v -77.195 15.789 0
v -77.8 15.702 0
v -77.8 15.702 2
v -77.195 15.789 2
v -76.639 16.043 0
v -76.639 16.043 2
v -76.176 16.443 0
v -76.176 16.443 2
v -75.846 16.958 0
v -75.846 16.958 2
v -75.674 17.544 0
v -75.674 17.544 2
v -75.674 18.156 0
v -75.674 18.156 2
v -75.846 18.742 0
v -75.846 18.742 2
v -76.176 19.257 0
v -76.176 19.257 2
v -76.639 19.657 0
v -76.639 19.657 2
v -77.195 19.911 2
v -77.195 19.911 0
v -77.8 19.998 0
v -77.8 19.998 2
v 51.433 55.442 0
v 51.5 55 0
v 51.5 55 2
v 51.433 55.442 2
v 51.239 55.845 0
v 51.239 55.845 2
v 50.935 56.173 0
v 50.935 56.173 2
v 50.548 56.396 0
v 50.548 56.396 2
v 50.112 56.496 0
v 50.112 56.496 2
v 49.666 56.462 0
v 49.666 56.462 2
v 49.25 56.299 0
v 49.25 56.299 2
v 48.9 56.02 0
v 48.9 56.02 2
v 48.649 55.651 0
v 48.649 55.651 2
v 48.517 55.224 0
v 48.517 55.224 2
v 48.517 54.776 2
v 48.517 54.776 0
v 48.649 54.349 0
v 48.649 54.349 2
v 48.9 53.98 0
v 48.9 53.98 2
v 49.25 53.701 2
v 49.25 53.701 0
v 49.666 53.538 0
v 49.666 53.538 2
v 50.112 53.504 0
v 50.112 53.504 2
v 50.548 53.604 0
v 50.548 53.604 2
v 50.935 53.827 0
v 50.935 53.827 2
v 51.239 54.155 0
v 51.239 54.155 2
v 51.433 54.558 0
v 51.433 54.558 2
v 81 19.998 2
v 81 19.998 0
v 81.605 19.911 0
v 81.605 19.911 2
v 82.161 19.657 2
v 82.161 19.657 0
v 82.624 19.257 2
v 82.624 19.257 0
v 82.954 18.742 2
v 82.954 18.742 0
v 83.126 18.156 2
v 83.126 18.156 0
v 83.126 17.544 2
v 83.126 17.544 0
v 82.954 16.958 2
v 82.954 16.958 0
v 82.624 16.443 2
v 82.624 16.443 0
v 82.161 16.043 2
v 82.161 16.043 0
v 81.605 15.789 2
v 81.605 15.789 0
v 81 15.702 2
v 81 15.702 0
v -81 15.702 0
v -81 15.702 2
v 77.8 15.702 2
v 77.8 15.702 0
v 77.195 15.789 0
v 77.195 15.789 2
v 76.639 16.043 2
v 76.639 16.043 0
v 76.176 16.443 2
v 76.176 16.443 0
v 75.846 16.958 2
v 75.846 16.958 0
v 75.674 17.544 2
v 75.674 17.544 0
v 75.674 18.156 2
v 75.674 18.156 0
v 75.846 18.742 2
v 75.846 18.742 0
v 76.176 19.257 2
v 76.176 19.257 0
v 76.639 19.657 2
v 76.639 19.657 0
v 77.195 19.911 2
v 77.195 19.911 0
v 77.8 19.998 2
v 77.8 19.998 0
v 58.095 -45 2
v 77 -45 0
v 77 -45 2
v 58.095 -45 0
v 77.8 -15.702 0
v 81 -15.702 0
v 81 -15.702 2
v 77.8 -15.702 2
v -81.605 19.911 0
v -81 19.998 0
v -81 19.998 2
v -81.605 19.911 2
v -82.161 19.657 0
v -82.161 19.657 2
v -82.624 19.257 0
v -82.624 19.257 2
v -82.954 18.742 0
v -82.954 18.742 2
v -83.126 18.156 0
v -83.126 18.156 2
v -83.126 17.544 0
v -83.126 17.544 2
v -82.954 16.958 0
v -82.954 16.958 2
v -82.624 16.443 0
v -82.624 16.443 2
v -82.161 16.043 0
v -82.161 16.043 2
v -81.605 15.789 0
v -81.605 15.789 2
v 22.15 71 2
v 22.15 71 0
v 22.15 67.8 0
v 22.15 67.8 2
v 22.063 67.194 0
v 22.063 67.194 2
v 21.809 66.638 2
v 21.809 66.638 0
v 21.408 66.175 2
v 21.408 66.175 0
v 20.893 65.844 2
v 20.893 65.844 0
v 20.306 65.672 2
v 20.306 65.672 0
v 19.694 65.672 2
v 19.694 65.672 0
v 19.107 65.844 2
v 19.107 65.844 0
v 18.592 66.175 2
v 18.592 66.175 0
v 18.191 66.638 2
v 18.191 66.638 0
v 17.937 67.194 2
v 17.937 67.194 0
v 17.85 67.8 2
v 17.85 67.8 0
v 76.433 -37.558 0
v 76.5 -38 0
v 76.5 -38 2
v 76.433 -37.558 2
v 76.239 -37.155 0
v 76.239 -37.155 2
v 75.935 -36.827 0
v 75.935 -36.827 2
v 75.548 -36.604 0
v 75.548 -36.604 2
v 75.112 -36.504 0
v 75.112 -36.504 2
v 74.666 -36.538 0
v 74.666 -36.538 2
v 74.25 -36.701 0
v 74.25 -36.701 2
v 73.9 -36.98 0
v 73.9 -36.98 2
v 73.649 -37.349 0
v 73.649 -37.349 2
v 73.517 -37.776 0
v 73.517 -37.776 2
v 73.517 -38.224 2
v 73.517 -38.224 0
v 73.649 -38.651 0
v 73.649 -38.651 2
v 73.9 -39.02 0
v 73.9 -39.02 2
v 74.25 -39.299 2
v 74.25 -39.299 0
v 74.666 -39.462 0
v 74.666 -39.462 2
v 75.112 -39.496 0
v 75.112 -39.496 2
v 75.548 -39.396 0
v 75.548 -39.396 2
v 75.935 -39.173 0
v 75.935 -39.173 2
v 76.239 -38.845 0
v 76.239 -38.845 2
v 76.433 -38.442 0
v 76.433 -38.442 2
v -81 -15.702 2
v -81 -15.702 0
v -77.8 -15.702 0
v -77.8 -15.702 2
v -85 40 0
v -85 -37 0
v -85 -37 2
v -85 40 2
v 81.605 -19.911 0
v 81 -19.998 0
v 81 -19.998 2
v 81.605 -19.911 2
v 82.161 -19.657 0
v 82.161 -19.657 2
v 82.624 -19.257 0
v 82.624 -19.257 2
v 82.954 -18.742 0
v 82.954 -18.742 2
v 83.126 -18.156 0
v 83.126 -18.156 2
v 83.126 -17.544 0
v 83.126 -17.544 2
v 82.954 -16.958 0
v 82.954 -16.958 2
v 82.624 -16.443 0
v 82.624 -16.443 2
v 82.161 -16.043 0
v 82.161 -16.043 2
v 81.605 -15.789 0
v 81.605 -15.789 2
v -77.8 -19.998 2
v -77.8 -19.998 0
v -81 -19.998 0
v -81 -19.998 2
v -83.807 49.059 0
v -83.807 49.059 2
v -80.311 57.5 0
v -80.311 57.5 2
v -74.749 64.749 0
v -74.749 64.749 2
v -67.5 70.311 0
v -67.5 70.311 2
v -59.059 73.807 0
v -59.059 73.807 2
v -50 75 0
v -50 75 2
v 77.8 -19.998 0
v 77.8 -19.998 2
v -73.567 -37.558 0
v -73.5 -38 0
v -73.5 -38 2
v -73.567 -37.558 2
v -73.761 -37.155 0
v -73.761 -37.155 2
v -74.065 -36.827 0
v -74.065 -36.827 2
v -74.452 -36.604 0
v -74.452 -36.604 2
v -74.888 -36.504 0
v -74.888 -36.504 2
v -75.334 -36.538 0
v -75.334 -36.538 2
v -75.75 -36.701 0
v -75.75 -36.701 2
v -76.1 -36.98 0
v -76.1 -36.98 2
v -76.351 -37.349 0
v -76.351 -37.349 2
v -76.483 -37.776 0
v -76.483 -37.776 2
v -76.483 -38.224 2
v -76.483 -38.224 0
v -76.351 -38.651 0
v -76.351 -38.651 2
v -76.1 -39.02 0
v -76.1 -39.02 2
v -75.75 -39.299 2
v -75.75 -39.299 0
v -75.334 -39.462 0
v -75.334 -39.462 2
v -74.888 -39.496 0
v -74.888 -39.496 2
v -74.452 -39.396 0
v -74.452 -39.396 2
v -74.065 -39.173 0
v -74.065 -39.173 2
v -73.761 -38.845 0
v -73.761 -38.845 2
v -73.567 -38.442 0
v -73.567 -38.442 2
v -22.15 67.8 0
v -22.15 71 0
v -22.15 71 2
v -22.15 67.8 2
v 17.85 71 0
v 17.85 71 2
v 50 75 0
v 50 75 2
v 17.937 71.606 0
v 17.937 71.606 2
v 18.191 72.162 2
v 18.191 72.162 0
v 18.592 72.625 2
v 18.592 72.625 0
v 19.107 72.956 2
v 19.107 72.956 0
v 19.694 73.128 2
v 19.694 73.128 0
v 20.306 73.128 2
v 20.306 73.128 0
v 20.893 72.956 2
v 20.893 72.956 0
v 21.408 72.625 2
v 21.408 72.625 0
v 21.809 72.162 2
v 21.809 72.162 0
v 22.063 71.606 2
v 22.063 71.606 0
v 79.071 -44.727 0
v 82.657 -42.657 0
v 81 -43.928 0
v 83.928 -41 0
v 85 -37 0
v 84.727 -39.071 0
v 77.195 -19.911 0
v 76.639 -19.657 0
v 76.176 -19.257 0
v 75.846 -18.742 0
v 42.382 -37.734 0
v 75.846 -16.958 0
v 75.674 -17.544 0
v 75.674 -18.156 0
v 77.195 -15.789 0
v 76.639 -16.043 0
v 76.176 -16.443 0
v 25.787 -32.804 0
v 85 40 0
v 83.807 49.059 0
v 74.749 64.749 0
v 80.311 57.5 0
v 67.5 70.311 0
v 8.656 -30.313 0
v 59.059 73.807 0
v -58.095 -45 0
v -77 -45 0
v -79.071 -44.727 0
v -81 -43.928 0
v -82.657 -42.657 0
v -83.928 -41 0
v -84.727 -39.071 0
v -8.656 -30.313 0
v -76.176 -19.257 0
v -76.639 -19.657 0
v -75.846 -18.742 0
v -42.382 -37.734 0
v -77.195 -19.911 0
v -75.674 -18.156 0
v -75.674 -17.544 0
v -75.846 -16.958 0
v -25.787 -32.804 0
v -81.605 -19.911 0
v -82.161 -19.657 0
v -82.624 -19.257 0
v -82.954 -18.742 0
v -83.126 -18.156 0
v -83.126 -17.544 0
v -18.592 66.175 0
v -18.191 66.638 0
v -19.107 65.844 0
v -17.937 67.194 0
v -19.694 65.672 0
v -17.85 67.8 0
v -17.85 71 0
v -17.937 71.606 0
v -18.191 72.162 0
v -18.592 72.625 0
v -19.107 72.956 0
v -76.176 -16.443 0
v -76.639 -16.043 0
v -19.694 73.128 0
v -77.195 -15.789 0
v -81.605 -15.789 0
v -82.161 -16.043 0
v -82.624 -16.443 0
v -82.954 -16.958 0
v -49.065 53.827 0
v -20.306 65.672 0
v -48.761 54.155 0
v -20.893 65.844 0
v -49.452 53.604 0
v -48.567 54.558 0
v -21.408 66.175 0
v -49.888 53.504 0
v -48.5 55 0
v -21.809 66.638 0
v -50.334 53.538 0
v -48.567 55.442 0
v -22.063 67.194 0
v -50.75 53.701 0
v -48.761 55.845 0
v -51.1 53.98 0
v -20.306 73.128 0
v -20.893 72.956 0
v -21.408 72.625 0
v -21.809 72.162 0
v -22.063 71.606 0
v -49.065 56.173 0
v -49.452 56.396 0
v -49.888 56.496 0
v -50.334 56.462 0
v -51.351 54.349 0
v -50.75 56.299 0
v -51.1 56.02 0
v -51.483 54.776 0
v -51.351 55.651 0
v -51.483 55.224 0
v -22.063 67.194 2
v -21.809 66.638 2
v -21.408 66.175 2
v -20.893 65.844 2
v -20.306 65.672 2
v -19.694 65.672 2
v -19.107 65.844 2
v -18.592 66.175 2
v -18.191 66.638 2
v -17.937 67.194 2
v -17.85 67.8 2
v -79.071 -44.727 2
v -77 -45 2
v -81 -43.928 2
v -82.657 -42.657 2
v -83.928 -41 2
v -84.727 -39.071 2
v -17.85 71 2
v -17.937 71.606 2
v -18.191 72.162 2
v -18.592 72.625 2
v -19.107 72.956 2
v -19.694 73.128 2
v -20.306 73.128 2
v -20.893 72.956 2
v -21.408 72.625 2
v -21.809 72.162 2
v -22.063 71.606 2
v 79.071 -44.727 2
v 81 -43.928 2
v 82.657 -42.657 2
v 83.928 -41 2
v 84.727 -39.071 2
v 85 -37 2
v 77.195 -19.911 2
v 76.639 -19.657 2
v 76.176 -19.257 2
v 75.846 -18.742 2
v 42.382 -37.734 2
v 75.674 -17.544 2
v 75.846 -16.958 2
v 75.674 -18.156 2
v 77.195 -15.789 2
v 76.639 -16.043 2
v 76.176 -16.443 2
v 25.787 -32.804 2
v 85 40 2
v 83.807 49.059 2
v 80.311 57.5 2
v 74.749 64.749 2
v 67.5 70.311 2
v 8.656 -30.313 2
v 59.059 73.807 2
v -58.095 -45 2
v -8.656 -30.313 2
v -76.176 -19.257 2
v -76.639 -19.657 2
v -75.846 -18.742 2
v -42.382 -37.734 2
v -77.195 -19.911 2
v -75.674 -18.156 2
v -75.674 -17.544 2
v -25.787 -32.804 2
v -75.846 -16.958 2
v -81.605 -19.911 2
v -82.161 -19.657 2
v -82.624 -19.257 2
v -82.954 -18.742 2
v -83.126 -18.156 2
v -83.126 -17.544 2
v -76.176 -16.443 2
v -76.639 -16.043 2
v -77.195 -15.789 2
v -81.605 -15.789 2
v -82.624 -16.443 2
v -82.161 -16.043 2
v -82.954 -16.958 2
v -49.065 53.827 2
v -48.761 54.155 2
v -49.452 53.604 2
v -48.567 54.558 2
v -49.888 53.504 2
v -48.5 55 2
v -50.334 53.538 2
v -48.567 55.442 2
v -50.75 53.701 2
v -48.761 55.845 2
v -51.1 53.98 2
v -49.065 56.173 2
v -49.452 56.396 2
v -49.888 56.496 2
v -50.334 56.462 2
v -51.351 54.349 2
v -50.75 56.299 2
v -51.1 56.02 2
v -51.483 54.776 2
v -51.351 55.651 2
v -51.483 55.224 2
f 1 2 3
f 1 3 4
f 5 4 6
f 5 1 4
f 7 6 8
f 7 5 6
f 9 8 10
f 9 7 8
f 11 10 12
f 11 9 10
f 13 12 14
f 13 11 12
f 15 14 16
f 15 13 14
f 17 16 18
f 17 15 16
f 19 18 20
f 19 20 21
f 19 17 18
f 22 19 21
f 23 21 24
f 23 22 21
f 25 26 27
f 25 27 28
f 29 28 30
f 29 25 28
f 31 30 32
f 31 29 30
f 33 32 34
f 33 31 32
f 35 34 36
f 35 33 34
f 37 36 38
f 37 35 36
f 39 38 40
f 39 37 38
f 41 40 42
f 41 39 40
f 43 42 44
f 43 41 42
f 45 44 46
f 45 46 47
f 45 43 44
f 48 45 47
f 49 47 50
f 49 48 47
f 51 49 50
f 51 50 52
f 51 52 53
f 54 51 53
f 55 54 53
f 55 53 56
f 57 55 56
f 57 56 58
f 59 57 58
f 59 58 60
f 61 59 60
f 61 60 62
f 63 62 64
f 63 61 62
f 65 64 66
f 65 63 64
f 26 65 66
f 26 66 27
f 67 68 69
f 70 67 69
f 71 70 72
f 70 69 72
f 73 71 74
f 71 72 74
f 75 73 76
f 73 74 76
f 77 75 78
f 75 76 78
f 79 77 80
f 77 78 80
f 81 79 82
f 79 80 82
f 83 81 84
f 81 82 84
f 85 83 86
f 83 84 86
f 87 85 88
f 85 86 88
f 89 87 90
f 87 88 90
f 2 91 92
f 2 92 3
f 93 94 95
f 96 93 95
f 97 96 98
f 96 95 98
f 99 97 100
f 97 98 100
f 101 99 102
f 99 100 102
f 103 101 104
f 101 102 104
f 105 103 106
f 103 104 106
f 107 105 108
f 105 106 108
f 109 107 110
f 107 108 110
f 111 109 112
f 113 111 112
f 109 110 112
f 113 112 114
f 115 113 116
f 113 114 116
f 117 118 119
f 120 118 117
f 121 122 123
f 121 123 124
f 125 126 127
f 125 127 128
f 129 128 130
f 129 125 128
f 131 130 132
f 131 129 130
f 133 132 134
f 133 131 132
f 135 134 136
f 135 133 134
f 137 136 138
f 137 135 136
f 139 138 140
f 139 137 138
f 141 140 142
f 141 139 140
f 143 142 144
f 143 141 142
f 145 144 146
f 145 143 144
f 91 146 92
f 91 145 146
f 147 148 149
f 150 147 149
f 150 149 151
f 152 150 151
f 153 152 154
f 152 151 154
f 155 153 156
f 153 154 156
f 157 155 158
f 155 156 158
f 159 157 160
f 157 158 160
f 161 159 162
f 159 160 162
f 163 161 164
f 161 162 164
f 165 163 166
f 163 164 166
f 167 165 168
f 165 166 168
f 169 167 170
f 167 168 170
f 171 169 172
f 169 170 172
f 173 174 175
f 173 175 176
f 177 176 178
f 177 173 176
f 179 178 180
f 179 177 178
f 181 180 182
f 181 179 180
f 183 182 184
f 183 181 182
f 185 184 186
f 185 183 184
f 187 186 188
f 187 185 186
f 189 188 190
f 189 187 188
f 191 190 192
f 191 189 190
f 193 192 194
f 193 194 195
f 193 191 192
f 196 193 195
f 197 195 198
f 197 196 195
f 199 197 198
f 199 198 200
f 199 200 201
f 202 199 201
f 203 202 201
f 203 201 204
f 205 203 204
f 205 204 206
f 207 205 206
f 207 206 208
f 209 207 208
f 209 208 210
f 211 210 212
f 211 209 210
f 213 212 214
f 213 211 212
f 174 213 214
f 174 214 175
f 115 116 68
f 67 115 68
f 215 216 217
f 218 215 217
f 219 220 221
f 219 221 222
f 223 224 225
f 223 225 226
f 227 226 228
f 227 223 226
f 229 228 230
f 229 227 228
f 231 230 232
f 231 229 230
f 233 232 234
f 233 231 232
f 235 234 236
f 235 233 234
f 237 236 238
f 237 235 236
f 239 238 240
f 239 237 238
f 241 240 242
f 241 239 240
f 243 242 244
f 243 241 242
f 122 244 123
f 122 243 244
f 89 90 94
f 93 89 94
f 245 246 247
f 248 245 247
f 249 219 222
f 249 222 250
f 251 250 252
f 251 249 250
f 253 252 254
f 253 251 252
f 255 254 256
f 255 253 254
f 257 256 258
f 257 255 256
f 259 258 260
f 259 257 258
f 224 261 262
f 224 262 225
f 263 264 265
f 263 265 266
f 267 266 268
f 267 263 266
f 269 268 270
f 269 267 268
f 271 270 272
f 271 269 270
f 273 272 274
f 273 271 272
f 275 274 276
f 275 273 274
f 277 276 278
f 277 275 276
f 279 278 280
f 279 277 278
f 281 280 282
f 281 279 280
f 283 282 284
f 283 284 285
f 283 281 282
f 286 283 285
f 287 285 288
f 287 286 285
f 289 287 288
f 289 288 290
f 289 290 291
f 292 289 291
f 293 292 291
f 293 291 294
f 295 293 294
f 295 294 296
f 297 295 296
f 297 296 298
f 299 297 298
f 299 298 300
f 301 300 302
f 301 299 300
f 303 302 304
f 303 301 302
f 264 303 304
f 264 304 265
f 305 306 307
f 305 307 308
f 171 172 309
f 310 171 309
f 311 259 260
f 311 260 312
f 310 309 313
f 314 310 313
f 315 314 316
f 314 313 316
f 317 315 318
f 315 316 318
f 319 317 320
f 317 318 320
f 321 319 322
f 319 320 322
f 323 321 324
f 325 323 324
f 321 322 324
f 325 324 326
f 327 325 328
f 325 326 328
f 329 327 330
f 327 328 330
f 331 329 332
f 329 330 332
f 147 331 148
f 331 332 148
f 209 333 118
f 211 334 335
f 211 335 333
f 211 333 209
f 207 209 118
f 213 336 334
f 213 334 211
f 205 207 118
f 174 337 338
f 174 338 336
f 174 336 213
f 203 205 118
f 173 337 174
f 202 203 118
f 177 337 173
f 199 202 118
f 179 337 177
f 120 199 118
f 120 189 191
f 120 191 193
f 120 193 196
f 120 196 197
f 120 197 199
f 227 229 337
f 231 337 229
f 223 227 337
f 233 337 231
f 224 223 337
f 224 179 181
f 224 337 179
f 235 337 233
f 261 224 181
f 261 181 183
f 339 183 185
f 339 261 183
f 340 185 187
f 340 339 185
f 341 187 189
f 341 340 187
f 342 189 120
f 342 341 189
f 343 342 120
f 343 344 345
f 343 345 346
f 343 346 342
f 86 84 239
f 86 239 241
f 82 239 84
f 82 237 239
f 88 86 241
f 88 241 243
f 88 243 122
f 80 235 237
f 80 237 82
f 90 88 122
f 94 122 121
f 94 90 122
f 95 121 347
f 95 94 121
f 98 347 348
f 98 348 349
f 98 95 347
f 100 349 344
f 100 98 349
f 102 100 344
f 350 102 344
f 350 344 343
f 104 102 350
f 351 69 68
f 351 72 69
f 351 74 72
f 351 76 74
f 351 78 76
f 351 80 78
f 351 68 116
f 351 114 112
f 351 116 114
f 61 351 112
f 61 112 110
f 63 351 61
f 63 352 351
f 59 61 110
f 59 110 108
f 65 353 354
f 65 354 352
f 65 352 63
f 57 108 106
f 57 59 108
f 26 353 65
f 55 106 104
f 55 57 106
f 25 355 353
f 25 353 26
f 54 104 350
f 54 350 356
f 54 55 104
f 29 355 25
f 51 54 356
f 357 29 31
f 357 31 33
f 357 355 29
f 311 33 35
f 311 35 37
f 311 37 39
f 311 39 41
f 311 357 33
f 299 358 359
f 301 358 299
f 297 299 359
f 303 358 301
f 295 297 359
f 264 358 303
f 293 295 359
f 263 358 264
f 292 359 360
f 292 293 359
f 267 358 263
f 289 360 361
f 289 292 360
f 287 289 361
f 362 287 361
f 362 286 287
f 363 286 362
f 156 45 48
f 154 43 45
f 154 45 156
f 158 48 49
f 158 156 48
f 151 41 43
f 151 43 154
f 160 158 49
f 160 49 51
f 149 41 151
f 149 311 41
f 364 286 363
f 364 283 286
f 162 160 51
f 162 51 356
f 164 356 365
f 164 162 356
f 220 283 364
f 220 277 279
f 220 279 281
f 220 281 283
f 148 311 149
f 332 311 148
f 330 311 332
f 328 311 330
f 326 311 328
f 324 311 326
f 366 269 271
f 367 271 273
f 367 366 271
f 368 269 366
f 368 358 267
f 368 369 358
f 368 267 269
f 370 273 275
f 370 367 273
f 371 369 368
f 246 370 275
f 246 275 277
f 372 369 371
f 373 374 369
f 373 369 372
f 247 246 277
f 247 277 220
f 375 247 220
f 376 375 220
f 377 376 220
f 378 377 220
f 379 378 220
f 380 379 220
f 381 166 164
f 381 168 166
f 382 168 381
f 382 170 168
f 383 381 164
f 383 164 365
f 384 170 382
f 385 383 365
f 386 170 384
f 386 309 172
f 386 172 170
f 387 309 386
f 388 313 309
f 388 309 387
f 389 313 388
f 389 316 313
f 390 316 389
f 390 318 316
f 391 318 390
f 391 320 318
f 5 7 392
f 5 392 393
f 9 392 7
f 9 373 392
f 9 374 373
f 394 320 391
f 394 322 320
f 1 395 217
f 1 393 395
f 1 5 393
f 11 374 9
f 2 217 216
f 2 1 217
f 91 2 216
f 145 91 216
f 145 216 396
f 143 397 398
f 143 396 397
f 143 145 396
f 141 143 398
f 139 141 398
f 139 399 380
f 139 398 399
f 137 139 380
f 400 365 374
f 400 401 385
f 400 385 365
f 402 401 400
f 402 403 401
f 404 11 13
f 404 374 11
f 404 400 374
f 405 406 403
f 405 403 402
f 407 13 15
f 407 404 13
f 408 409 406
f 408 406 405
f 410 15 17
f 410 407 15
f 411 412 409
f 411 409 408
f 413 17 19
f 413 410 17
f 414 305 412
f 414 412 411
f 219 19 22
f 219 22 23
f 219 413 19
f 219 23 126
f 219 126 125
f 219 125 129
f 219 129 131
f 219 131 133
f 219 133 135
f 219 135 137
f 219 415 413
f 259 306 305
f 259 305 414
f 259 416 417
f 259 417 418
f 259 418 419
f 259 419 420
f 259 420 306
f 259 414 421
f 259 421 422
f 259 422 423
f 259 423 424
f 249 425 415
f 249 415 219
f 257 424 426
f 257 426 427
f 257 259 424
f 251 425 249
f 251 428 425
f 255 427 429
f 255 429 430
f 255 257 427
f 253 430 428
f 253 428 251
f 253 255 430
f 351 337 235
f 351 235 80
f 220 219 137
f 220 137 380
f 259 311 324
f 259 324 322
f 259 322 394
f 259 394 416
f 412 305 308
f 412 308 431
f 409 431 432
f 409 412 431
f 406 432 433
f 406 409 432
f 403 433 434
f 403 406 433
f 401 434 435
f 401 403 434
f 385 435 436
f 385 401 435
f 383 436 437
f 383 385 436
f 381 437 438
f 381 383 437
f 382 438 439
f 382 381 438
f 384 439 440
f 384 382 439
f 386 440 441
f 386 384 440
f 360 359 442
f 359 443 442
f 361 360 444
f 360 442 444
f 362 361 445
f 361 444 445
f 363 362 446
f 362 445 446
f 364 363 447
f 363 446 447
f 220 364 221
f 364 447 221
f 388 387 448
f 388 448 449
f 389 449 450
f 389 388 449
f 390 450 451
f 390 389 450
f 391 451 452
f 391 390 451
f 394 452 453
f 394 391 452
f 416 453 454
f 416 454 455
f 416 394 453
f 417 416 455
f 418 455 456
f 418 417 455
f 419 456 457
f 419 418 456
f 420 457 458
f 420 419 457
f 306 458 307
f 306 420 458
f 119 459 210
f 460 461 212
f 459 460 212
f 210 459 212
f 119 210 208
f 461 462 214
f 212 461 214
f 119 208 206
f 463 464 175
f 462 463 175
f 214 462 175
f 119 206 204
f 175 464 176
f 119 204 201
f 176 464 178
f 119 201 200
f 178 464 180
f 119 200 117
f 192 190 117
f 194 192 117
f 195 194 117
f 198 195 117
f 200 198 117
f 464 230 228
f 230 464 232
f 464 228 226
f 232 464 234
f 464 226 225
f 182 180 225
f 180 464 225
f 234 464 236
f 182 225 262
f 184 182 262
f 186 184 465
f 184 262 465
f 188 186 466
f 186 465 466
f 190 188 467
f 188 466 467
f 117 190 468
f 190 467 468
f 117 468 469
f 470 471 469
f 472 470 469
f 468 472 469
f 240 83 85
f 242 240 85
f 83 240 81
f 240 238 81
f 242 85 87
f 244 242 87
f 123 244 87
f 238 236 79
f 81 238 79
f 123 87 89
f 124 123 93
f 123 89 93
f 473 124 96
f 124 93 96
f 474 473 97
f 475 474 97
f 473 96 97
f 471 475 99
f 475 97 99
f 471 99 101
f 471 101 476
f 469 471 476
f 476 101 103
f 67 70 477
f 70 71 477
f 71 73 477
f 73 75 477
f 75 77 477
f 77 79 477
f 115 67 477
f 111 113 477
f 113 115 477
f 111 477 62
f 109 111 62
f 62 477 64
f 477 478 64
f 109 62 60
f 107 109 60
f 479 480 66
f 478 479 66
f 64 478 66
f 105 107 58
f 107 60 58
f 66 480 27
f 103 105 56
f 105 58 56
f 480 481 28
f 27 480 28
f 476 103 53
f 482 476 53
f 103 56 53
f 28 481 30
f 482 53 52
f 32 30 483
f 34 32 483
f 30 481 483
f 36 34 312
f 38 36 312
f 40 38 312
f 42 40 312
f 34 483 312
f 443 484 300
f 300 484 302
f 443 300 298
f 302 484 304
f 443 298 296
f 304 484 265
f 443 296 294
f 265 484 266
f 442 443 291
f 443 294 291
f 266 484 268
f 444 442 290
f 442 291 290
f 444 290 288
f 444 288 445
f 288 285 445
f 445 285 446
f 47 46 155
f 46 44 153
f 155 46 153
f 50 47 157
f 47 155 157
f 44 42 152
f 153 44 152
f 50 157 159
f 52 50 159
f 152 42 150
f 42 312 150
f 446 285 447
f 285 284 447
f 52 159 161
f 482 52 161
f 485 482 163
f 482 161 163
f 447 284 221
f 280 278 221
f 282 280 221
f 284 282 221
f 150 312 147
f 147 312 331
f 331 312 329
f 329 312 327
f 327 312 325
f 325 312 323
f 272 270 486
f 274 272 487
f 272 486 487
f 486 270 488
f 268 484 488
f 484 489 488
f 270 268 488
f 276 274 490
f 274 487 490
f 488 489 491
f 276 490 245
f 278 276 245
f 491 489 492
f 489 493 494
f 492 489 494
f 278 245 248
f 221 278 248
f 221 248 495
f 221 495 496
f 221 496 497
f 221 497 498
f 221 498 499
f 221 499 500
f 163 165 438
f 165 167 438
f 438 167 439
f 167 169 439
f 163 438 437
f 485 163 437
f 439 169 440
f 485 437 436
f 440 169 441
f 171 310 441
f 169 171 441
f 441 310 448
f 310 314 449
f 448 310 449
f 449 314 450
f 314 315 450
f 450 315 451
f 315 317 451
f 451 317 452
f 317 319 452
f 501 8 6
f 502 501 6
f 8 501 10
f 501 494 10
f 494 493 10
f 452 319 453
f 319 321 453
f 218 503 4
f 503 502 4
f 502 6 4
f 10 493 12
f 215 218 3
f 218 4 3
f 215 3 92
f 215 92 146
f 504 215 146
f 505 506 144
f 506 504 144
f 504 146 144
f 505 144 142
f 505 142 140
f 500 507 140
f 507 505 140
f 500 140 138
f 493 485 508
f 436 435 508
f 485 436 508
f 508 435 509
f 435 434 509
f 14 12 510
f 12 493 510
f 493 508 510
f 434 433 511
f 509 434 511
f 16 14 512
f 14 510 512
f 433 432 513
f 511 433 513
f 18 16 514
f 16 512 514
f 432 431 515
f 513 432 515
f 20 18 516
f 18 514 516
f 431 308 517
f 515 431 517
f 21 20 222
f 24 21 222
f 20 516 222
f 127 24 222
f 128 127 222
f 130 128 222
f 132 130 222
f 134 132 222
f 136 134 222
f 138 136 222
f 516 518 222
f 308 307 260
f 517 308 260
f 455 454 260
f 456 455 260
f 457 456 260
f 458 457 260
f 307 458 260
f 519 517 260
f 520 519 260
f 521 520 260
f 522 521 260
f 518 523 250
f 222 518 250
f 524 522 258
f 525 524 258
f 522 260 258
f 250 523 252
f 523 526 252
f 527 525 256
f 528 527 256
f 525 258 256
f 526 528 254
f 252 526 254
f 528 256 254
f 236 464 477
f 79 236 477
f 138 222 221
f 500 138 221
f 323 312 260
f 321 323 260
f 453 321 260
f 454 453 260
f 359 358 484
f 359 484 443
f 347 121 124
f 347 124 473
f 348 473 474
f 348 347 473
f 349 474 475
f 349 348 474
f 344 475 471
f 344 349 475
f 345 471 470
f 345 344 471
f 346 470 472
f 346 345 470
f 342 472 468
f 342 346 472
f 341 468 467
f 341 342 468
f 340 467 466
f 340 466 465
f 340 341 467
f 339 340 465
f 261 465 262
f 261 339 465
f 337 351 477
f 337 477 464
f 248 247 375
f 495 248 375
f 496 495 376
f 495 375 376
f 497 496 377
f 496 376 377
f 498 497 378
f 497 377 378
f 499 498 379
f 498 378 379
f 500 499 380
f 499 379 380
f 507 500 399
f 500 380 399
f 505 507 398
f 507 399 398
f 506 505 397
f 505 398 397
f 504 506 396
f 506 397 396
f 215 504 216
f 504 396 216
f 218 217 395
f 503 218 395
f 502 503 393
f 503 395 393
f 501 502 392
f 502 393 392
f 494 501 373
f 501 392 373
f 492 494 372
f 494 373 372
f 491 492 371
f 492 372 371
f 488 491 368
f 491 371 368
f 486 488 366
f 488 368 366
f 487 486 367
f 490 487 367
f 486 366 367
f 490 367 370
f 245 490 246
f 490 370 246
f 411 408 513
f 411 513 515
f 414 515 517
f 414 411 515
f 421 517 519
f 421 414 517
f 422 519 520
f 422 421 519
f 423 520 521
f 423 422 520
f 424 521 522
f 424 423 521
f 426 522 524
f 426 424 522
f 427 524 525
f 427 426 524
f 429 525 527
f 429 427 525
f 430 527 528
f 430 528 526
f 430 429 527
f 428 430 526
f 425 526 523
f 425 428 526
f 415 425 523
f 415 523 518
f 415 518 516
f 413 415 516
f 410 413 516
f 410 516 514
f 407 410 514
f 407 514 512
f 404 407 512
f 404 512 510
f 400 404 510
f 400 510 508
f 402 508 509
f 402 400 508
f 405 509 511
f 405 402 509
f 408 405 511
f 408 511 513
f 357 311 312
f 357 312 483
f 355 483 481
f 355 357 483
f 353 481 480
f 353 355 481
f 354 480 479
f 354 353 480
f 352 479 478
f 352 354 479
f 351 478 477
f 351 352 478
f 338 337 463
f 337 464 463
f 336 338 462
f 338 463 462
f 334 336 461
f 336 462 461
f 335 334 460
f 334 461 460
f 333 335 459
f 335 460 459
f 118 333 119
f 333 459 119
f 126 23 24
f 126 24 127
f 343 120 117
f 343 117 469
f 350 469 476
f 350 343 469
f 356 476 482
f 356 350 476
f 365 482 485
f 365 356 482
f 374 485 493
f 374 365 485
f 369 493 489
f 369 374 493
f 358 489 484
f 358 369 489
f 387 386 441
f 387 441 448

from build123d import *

# Parameters (mm, degrees)
SKETCH1_R           = 1.5
BOSS_EXTRUDE1_DEPTH = 2
FILLET1_R           = 8


with BuildPart() as part:
    # Sketch1 → Boss-Extrude1 (new body)
    with BuildSketch(Plane.XY):
        with BuildLine():
            Line((85, 40), (85, -45))
            Line((85, -45), (58.094750193, -45))
            ThreePointArc((58.094750193, -45), (0, -30), (-58.094750193, -45))
            Line((-58.094750193, -45), (-85, -45))
            Line((-85, -45), (-85, 40))
            ThreePointArc((-85, 40), (-74.748737342, 64.748737342), (-50, 75))
            Line((-50, 75), (50, 75))
            ThreePointArc((50, 75), (74.748737342, 64.748737342), (85, 40))
        make_face()
        with Locations((50, 55)):
            Circle(SKETCH1_R, mode=Mode.SUBTRACT)
        with Locations((-75, -38)):
            Circle(SKETCH1_R, mode=Mode.SUBTRACT)
        with Locations((75, -38)):
            Circle(SKETCH1_R, mode=Mode.SUBTRACT)
        with Locations((-50, 55)):
            Circle(SKETCH1_R, mode=Mode.SUBTRACT)
        with BuildLine():
            ThreePointArc((-22.15, 67.8), (-20, 65.65), (-17.85, 67.8))
            Line((-17.85, 67.8), (-17.85, 71))
            ThreePointArc((-17.85, 71), (-20, 73.15), (-22.15, 71))
            Line((-22.15, 71), (-22.15, 67.8))
        make_face(mode=Mode.SUBTRACT)
        with BuildLine():
            Line((81, 15.701693023), (77.8, 15.701693023))
            ThreePointArc((77.8, 15.701693023), (75.651693023, 17.85), (77.8, 19.998306977))
            Line((77.8, 19.998306977), (81, 19.998306977))
            ThreePointArc((81, 19.998306977), (83.148306977, 17.85), (81, 15.701693023))
        make_face(mode=Mode.SUBTRACT)
        with BuildLine():
            Line((-81, -15.701693023), (-77.8, -15.701693023))
            ThreePointArc((-77.8, -15.701693023), (-75.651693023, -17.85), (-77.8, -19.998306977))
            Line((-77.8, -19.998306977), (-81, -19.998306977))
            ThreePointArc((-81, -19.998306977), (-83.148306977, -17.85), (-81, -15.701693023))
        make_face(mode=Mode.SUBTRACT)
        with BuildLine():
            ThreePointArc((-77.8, 15.701693023), (-75.651693023, 17.85), (-77.8, 19.998306977))
            Line((-77.8, 19.998306977), (-81, 19.998306977))
            ThreePointArc((-81, 19.998306977), (-83.148306977, 17.85), (-81, 15.701693023))
            Line((-81, 15.701693023), (-77.8, 15.701693023))
        make_face(mode=Mode.SUBTRACT)
        with BuildLine():
            ThreePointArc((77.8, -15.701693023), (75.651693023, -17.85), (77.8, -19.998306977))
            Line((77.8, -19.998306977), (81, -19.998306977))
            ThreePointArc((81, -19.998306977), (83.148306977, -17.85), (81, -15.701693023))
            Line((81, -15.701693023), (77.8, -15.701693023))
        make_face(mode=Mode.SUBTRACT)
        with BuildLine():
            Line((22.15, 71), (22.15, 67.8))
            ThreePointArc((22.15, 67.8), (20, 65.65), (17.85, 67.8))
            Line((17.85, 67.8), (17.85, 71))
            ThreePointArc((17.85, 71), (20, 73.15), (22.15, 71))
        make_face(mode=Mode.SUBTRACT)
    extrude(amount=BOSS_EXTRUDE1_DEPTH)

    # Fillet1
    fillet1_edges = [part.edges().sort_by_distance(p)[0] for p in [
        (85, -45, 1),
        (-85, -45, 1),
    ]]
    fillet(fillet1_edges, radius=FILLET1_R)


solid = part.part
